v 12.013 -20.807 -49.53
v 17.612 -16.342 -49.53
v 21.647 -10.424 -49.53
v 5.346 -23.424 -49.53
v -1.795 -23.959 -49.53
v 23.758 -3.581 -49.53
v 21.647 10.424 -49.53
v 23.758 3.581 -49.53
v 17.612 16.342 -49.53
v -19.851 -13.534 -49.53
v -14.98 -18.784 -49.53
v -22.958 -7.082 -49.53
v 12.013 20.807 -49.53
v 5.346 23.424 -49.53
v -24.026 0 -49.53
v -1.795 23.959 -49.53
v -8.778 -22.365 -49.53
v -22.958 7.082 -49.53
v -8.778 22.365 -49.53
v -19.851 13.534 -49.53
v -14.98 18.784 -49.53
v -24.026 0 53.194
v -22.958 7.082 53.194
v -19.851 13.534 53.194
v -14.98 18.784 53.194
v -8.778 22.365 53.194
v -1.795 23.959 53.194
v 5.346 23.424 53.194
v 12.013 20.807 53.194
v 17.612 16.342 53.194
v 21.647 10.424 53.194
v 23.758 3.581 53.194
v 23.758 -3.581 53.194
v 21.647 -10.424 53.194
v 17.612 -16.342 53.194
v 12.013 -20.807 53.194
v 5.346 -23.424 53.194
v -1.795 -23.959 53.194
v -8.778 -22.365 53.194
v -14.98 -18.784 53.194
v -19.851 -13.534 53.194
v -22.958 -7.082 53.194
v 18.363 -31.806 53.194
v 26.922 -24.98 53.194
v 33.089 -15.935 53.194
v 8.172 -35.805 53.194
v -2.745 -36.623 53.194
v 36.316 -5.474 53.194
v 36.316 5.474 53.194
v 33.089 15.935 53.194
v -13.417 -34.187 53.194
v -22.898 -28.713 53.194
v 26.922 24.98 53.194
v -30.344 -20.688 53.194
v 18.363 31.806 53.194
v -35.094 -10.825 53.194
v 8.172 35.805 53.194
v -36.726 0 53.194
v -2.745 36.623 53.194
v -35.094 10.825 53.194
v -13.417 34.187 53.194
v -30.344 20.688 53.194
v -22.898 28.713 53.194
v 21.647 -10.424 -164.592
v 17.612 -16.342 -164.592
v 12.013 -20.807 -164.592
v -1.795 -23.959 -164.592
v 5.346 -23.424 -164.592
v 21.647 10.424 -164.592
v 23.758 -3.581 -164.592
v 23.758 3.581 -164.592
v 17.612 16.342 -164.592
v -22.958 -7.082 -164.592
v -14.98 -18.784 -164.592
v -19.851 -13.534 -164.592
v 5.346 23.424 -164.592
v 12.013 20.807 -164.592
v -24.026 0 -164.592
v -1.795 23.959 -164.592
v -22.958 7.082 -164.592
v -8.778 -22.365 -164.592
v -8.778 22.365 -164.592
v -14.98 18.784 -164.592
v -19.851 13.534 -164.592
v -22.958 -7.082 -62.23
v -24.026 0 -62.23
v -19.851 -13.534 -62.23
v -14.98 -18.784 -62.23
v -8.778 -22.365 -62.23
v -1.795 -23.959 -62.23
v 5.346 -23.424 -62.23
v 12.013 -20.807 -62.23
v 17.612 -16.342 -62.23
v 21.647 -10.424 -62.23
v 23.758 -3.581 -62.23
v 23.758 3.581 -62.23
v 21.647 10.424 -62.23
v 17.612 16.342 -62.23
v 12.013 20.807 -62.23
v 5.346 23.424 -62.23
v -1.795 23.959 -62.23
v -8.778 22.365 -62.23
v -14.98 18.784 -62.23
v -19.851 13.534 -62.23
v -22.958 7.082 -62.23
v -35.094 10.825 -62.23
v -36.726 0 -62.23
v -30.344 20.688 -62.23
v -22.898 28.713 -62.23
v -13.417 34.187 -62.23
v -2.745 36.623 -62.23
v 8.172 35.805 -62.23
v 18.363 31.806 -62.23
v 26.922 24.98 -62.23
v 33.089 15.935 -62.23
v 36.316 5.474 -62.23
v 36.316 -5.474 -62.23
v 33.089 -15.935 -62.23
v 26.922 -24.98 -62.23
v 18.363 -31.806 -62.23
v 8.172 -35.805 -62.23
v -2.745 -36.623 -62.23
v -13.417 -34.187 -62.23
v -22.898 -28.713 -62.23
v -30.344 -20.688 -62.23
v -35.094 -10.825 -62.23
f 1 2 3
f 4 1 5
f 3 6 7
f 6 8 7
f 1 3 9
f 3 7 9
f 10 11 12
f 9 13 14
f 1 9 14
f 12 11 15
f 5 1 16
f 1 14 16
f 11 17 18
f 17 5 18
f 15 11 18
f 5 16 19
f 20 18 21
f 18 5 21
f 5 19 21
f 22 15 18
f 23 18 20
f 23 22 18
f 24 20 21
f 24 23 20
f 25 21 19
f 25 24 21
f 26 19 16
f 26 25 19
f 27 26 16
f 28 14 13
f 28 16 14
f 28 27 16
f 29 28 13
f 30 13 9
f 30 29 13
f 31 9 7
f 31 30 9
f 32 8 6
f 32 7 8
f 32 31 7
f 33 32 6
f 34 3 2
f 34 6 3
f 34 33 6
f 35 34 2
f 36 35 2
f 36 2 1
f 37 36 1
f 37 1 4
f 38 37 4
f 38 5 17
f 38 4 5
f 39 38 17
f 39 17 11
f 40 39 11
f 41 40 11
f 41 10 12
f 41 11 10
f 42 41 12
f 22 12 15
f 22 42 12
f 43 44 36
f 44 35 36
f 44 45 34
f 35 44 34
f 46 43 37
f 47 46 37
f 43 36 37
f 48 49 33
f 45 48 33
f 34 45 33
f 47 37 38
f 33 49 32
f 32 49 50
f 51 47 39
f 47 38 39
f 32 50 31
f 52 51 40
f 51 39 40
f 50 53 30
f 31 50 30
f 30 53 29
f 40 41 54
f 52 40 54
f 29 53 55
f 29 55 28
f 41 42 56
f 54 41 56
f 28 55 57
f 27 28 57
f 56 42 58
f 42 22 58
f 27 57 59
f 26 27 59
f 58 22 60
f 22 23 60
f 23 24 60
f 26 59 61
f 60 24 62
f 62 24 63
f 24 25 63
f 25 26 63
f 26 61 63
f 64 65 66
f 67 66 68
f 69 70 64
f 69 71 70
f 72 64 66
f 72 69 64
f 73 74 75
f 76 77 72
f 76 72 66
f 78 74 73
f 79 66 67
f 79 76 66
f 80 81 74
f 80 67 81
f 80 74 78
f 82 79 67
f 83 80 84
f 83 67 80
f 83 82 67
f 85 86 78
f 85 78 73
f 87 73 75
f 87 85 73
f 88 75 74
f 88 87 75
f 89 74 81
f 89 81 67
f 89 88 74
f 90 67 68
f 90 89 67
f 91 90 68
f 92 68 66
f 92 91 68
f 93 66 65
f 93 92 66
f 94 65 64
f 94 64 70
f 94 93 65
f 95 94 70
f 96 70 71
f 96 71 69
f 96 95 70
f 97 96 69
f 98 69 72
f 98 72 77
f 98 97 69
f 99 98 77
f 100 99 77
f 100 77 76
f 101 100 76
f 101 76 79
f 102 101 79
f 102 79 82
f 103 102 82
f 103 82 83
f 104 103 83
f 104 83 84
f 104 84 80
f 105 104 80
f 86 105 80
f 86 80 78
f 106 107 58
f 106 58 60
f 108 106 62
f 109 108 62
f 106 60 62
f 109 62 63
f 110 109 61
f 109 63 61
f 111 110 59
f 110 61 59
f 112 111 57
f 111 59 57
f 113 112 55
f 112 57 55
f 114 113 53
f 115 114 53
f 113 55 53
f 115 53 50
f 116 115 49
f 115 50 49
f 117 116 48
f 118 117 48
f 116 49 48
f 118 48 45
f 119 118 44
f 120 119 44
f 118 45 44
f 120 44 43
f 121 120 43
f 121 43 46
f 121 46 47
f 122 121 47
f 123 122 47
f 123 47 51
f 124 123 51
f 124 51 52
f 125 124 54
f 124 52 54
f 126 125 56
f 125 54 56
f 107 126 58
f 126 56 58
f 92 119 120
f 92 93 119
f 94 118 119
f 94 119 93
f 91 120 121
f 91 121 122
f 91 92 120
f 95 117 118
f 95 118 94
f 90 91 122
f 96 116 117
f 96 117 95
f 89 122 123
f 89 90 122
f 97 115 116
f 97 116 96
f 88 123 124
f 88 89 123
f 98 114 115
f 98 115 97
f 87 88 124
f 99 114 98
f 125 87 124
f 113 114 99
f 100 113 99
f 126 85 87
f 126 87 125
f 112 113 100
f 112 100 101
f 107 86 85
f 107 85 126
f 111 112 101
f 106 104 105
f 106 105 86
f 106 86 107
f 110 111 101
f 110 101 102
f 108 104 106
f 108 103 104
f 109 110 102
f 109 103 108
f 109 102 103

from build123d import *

# Parameters (mm, degrees)
F0_W     = 36.7259010673
F0_H     = 115.4242623597
F2_T     = -12.7
F3_DEPTH = 115.062


with BuildPart() as f1:
    # F0 (on Front) → F1 (revolve)
    with BuildSketch(Plane.XZ):
        with Locations((-18.3629505336, -4.5178690925)):
            Rectangle(F0_W, F0_H)
    revolve(axis=Axis((0, 0, -4.5178690925), (0, 0, -1)))

    # F2
    f2_openings = [f1.faces().sort_by_distance(p)[0] for p in [
        (0, 0, 53.194262),
    ]]
    offset(amount=F2_T, openings=f2_openings)

    # F3 (add): a face of the model
    f3_faces = [f1.faces().sort_by_distance(p)[0] for p in [
        (0, 0, -49.5300002724),
    ]]
    extrude(f3_faces, amount=-F3_DEPTH)


solid = f1.part
